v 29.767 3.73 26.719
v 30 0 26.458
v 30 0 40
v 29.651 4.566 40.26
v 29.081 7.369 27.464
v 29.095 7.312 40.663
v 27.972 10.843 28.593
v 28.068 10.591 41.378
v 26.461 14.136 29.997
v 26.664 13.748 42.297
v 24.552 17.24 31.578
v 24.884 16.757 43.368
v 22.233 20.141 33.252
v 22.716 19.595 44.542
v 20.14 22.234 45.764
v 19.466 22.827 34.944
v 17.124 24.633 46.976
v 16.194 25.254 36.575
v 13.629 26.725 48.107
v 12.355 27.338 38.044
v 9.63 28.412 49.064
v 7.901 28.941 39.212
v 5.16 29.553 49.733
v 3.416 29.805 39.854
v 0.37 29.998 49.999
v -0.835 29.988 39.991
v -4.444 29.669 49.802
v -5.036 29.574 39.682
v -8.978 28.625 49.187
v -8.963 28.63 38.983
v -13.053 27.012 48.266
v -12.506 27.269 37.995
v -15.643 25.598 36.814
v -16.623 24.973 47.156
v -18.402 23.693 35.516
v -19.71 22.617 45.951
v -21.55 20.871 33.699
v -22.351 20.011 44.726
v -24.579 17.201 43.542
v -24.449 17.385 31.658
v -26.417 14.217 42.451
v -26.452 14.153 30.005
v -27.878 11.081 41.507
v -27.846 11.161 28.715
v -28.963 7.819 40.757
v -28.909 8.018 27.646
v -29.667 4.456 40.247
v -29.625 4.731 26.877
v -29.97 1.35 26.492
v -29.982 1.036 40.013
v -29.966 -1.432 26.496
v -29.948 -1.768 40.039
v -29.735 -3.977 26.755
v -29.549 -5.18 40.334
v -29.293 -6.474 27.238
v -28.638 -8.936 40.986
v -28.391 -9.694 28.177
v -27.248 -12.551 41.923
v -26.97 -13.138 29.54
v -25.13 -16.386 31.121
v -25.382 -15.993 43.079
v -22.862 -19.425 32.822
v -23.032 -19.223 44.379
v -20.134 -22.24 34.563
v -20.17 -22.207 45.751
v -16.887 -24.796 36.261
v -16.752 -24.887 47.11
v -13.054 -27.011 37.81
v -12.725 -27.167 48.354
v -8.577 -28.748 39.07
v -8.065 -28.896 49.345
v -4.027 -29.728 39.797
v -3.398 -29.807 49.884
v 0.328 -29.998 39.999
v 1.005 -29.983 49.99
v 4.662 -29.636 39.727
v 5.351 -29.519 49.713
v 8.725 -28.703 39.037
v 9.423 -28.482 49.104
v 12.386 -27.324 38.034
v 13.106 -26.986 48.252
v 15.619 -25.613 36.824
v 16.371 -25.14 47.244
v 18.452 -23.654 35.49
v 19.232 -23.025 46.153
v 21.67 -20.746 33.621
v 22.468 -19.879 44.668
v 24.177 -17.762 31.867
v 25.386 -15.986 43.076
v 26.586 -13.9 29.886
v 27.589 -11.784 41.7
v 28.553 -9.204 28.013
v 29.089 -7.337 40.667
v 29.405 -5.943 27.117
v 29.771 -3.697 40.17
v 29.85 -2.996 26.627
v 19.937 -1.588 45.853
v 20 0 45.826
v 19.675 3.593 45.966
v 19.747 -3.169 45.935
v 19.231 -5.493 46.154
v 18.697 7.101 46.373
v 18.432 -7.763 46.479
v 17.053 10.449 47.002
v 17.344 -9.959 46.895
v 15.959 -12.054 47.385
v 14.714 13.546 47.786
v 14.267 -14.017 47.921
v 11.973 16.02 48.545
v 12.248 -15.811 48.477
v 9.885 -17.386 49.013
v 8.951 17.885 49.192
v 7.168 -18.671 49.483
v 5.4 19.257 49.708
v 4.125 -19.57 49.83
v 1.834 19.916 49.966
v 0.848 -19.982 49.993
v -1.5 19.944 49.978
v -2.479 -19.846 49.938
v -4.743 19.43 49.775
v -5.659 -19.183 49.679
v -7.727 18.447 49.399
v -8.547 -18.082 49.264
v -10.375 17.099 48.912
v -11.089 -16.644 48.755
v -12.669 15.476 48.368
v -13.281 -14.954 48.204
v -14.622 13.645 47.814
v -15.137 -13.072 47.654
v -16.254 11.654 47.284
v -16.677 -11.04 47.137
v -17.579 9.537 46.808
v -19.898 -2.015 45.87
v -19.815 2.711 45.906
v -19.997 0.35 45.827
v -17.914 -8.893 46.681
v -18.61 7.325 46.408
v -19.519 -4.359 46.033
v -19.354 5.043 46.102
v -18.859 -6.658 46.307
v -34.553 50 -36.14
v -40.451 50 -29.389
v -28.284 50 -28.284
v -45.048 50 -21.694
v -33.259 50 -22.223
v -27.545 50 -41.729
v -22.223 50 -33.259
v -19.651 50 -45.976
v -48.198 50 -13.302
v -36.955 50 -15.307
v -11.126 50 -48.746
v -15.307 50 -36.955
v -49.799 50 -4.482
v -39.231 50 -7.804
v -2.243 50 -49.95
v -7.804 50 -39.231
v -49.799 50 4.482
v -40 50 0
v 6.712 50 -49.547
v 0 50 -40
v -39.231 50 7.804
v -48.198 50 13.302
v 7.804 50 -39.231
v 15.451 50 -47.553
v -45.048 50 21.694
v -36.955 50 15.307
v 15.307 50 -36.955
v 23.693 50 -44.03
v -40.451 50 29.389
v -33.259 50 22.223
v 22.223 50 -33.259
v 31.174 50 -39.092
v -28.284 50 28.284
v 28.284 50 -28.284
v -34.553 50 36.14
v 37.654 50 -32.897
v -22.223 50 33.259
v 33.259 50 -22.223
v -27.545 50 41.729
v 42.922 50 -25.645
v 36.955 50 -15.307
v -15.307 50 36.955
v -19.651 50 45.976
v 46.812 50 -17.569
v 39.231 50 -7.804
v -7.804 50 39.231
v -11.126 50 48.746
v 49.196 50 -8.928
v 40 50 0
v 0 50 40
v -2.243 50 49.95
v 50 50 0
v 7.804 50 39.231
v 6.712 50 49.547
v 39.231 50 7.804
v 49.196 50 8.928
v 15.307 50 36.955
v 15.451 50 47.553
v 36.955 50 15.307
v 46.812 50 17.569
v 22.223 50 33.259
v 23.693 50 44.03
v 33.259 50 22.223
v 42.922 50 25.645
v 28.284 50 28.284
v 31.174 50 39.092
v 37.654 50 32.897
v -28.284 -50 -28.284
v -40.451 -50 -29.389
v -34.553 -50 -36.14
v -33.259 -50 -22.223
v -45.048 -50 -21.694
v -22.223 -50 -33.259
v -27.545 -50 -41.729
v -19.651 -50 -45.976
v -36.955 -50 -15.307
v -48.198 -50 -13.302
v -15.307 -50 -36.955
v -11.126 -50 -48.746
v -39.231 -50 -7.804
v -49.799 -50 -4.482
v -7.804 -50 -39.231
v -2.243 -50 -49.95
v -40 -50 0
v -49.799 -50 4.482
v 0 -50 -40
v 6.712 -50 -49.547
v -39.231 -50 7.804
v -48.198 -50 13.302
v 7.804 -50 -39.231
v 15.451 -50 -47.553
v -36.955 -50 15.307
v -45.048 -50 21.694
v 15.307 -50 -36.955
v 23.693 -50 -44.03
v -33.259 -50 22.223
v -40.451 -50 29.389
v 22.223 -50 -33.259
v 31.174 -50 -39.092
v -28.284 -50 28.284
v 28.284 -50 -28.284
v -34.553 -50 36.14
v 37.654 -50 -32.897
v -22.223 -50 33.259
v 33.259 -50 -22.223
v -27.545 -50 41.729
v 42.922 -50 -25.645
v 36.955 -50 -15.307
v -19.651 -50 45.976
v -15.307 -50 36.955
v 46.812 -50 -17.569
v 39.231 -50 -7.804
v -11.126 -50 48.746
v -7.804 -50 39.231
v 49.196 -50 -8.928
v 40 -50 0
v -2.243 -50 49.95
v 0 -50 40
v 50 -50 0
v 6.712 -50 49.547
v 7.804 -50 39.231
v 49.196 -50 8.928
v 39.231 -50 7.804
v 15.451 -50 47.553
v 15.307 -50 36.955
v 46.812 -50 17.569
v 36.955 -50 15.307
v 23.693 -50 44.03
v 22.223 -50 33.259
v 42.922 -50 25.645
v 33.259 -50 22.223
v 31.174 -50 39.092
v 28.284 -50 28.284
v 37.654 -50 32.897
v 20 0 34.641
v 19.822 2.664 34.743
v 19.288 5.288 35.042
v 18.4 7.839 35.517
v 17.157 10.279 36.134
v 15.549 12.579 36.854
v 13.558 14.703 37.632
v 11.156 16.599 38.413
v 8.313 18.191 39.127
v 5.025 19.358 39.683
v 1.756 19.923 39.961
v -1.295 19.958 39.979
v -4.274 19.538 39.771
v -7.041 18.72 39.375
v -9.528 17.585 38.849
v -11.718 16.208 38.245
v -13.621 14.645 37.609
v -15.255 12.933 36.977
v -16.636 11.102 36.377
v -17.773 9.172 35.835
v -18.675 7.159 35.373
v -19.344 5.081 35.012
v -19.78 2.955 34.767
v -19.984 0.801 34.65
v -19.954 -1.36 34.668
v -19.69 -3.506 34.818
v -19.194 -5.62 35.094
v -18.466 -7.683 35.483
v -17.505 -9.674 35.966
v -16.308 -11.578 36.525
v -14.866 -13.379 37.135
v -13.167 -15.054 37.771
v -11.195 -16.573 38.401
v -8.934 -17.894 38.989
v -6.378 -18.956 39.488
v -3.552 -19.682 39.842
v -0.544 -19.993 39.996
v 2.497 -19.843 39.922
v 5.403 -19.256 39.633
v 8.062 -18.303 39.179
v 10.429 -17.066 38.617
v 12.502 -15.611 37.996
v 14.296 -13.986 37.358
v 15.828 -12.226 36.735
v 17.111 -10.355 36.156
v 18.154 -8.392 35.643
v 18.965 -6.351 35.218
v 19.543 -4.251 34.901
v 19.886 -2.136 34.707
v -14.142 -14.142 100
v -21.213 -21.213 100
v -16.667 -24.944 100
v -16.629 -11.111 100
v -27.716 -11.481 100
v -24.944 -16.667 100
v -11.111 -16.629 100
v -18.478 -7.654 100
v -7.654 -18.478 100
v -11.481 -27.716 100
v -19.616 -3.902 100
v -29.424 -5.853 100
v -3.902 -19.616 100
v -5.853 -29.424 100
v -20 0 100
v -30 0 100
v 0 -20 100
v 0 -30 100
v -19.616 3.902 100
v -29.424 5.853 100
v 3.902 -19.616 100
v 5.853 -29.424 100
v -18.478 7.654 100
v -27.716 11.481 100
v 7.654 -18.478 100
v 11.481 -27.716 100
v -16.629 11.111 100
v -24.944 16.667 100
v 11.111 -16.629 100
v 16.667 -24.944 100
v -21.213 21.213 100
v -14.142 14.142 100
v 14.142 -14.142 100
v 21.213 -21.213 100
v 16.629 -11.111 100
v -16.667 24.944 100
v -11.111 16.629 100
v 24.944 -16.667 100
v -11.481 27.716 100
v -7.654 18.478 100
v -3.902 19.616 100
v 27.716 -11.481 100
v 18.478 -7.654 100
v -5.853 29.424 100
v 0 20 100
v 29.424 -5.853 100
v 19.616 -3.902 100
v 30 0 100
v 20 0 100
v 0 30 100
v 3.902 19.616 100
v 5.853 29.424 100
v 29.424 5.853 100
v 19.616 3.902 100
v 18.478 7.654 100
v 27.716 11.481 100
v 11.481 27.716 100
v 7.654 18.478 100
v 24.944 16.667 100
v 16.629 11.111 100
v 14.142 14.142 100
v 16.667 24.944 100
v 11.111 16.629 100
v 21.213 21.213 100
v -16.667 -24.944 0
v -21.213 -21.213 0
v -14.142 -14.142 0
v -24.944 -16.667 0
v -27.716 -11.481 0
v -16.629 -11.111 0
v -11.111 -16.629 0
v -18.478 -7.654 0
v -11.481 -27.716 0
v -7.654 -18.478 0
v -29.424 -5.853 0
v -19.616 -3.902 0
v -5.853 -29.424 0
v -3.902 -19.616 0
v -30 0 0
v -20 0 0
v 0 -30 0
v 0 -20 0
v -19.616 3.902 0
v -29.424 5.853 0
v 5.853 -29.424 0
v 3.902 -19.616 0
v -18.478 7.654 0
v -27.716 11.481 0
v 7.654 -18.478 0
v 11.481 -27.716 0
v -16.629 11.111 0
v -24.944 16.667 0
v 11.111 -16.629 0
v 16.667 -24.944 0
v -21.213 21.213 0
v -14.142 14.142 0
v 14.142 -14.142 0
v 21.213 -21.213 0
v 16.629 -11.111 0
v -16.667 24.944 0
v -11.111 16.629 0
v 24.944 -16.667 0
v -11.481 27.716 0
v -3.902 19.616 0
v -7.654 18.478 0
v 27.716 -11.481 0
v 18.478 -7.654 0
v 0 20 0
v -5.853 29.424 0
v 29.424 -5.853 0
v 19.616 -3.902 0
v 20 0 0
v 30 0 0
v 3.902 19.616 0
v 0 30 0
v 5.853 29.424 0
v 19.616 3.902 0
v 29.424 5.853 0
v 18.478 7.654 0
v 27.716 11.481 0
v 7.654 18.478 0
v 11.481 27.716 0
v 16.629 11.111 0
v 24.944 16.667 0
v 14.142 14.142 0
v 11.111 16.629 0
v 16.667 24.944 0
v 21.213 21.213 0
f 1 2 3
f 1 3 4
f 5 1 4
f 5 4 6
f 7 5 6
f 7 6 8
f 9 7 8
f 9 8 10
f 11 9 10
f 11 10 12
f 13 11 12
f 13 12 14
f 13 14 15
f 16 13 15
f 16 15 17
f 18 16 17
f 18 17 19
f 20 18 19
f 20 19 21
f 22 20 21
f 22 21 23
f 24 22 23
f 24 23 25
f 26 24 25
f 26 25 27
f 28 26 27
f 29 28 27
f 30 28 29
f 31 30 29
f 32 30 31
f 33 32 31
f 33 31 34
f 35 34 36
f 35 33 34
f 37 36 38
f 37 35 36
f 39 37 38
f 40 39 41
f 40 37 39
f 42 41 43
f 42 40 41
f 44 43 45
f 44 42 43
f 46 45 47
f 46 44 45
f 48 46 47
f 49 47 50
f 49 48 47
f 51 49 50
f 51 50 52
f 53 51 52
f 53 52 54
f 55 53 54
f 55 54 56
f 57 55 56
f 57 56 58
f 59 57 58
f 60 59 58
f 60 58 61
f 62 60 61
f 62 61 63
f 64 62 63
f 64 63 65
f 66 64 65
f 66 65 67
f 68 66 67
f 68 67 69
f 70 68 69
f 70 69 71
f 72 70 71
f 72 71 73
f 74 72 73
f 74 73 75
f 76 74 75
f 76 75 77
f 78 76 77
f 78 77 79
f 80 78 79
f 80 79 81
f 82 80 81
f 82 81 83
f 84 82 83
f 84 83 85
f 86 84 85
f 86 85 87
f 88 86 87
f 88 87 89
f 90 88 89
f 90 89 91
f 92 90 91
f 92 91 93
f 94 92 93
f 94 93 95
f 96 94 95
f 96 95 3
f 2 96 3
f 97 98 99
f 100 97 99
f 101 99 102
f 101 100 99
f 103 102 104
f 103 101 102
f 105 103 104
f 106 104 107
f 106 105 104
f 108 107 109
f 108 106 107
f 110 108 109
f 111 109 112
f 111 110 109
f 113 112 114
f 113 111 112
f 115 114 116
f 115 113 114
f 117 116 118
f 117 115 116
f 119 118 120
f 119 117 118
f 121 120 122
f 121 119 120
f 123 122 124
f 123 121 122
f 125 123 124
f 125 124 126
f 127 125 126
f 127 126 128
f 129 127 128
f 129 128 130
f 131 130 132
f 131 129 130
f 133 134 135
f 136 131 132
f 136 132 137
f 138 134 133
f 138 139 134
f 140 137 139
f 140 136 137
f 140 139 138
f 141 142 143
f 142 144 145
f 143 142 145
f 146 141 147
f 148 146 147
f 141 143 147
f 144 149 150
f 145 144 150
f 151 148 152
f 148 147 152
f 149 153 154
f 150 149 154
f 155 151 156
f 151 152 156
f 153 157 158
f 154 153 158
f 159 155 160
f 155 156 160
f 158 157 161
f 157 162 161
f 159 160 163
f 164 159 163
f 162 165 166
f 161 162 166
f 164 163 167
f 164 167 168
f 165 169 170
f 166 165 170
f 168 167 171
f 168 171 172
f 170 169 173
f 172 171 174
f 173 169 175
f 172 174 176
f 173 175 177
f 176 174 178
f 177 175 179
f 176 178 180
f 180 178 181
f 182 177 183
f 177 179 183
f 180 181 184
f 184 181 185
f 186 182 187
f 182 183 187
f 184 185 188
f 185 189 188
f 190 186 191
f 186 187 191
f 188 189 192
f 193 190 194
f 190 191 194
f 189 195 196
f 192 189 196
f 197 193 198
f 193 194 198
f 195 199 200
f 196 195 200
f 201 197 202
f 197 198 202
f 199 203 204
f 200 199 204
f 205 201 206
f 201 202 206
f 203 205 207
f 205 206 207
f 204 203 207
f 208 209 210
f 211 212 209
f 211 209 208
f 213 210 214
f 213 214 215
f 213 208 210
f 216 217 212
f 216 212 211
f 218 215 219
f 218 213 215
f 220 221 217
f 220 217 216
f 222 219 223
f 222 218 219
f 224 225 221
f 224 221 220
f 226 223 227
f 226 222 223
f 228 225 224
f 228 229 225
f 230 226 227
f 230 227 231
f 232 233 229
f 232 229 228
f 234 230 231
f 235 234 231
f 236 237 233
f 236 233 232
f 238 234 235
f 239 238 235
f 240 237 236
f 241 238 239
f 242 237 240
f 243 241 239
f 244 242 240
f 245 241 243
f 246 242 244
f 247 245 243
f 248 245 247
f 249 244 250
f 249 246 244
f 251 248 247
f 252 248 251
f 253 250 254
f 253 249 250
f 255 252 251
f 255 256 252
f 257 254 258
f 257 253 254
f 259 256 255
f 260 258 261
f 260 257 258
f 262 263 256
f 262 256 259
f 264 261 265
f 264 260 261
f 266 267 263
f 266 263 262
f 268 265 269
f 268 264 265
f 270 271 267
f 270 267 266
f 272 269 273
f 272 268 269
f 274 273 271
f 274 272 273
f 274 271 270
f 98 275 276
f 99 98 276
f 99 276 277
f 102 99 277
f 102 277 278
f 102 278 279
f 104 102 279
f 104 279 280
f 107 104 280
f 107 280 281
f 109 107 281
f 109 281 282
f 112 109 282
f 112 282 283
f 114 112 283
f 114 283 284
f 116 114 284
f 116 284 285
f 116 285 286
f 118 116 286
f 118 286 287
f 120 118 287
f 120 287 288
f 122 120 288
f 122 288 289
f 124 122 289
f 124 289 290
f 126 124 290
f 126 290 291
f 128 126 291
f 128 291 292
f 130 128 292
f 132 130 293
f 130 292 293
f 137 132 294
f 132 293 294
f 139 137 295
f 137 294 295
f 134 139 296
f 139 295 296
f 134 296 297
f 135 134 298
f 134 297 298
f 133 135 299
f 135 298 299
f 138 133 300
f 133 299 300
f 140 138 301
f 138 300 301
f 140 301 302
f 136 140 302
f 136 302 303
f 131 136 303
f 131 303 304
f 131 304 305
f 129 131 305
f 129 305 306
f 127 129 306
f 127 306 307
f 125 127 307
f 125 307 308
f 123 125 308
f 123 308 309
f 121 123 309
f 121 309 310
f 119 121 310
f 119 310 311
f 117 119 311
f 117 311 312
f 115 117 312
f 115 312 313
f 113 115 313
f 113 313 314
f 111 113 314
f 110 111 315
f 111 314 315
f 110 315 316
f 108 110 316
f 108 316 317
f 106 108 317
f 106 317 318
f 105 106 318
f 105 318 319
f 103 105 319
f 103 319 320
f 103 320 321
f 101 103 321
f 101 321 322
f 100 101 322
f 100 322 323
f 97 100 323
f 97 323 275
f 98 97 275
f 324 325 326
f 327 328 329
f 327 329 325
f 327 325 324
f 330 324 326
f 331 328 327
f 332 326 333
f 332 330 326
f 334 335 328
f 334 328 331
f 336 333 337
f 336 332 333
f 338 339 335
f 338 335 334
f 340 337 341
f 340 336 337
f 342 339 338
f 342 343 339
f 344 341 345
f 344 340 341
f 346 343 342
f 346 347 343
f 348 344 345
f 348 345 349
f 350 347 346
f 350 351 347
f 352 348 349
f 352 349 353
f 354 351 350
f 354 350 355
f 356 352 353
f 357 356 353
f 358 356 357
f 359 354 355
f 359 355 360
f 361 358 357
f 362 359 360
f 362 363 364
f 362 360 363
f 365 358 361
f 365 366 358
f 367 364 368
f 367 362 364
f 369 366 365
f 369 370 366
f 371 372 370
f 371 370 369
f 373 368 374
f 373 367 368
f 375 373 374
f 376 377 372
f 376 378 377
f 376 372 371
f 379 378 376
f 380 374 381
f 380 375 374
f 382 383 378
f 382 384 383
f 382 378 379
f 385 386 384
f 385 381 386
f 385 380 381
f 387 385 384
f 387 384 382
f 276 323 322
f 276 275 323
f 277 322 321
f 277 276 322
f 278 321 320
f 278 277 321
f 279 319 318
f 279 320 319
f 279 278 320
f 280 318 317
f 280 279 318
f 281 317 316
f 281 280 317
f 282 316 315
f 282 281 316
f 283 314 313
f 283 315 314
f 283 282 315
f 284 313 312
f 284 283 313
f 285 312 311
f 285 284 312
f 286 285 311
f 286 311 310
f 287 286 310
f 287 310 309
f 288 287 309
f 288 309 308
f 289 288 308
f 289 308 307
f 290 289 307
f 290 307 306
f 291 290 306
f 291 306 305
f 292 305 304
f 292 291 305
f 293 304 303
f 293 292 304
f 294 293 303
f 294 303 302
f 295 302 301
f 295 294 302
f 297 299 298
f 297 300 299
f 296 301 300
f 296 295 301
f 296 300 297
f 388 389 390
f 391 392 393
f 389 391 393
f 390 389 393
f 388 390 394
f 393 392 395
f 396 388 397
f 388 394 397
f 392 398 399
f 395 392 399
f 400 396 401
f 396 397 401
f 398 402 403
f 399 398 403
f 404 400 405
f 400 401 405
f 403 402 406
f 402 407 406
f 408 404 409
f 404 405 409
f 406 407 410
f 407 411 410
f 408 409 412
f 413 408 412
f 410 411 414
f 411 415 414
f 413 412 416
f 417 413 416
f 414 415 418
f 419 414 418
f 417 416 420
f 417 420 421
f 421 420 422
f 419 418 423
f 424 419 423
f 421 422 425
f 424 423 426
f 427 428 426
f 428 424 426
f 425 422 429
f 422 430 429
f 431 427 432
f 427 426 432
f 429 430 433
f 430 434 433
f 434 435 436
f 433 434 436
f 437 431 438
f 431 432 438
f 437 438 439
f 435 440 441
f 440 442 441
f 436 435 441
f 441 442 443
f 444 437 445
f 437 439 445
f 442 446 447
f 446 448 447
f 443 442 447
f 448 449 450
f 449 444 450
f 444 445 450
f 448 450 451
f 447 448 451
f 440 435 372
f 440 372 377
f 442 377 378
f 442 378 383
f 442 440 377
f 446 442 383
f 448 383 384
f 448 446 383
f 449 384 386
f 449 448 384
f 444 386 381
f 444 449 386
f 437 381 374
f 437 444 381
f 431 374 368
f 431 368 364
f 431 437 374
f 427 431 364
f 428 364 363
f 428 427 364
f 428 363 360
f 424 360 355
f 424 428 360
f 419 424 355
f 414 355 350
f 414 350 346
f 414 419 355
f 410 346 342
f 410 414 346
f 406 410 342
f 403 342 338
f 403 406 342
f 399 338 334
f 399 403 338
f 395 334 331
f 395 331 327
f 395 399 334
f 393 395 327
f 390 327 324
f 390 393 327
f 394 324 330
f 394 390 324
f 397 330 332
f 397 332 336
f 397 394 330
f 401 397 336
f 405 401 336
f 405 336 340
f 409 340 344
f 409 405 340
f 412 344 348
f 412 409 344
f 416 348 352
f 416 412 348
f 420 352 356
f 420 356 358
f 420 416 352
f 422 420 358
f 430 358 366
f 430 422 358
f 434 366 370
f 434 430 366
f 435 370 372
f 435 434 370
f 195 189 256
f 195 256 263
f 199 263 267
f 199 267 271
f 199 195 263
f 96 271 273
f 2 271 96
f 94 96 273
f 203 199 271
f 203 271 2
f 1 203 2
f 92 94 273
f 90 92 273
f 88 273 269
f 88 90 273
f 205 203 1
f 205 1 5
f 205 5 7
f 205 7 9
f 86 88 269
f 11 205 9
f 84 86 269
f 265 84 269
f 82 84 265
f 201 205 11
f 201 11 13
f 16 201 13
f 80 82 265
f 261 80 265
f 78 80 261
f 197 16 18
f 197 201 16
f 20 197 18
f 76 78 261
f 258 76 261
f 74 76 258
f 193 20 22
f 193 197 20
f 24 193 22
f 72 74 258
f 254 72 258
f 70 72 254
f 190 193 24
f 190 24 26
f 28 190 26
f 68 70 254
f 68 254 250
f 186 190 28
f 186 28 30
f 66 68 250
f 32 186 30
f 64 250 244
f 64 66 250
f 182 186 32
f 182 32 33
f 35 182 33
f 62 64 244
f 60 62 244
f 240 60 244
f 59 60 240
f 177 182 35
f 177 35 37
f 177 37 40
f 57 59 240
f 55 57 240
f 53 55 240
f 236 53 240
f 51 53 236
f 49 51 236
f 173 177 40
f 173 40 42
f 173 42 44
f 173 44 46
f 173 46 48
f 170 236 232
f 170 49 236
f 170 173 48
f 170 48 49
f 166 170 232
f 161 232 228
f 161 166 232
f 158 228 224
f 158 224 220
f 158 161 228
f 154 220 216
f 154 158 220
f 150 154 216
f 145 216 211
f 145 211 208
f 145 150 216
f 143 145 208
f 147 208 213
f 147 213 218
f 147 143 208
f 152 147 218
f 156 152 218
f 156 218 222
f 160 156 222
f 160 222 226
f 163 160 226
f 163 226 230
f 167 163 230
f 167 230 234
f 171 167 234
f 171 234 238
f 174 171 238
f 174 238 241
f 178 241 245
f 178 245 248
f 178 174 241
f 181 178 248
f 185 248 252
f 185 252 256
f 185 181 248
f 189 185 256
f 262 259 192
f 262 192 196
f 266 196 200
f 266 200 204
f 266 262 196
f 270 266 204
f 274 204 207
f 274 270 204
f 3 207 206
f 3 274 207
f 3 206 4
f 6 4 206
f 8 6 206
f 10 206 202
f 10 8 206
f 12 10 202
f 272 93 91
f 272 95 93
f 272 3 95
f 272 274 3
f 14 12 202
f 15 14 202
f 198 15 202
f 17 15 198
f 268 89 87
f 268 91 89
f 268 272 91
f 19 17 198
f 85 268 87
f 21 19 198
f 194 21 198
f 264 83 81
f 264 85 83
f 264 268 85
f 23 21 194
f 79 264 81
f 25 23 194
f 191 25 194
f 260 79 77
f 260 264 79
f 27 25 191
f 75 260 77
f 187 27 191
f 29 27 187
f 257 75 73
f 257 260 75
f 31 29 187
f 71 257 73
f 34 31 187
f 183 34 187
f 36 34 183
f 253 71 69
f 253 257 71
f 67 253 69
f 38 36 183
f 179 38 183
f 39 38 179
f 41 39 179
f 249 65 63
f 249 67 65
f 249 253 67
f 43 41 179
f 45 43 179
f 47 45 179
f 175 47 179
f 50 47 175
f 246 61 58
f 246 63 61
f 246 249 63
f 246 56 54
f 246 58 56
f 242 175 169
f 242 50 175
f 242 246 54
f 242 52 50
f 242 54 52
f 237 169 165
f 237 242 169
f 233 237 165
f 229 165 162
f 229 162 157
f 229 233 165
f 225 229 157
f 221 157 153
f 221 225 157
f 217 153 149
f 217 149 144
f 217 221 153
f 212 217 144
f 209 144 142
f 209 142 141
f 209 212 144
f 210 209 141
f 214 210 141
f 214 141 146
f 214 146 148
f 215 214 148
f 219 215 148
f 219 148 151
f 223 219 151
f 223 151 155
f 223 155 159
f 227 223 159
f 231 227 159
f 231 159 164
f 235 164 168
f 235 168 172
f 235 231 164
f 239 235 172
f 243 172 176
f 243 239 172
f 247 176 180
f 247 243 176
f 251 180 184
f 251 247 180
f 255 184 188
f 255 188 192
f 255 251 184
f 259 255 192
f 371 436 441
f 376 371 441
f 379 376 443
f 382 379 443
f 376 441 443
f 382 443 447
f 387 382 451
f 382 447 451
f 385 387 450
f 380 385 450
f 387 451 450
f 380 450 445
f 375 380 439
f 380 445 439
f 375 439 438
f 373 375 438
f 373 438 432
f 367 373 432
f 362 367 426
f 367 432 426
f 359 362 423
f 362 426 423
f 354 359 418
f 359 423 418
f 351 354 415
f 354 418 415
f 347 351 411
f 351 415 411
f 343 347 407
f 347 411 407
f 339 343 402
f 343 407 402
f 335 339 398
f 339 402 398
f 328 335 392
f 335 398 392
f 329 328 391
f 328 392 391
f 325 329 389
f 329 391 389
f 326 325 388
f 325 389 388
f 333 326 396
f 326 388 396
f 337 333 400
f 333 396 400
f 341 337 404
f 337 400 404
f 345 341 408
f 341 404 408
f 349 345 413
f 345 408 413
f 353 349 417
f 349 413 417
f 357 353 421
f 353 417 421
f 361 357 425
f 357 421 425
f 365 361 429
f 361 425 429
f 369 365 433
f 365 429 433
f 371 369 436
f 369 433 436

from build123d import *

# Parameters (mm, degrees)
F0_R     = 50
F0_R_2   = 40
F1_DEPTH = 50
F2_R     = 30
F2_R_2   = 20
F3_DEPTH = 100


with BuildPart() as f1:
    # F0 (on Front) → F1 (new body, symmetric)
    with BuildSketch(Plane.XZ):
        Circle(F0_R)
        Circle(F0_R_2, mode=Mode.SUBTRACT)
    extrude(amount=F1_DEPTH, both=True)


with BuildPart() as f3:
    # F2 (on Top) → F3 (new body)
    with BuildSketch(Plane.XY):
        Circle(F2_R)
        Circle(F2_R_2, mode=Mode.SUBTRACT)
    extrude(amount=F3_DEPTH)


with BuildPart() as f1_1:
    add(f1.part)

    # F4: cut F3
    add(f3.part, mode=Mode.SUBTRACT)


solid = Compound([f3.part, f1_1.part])
